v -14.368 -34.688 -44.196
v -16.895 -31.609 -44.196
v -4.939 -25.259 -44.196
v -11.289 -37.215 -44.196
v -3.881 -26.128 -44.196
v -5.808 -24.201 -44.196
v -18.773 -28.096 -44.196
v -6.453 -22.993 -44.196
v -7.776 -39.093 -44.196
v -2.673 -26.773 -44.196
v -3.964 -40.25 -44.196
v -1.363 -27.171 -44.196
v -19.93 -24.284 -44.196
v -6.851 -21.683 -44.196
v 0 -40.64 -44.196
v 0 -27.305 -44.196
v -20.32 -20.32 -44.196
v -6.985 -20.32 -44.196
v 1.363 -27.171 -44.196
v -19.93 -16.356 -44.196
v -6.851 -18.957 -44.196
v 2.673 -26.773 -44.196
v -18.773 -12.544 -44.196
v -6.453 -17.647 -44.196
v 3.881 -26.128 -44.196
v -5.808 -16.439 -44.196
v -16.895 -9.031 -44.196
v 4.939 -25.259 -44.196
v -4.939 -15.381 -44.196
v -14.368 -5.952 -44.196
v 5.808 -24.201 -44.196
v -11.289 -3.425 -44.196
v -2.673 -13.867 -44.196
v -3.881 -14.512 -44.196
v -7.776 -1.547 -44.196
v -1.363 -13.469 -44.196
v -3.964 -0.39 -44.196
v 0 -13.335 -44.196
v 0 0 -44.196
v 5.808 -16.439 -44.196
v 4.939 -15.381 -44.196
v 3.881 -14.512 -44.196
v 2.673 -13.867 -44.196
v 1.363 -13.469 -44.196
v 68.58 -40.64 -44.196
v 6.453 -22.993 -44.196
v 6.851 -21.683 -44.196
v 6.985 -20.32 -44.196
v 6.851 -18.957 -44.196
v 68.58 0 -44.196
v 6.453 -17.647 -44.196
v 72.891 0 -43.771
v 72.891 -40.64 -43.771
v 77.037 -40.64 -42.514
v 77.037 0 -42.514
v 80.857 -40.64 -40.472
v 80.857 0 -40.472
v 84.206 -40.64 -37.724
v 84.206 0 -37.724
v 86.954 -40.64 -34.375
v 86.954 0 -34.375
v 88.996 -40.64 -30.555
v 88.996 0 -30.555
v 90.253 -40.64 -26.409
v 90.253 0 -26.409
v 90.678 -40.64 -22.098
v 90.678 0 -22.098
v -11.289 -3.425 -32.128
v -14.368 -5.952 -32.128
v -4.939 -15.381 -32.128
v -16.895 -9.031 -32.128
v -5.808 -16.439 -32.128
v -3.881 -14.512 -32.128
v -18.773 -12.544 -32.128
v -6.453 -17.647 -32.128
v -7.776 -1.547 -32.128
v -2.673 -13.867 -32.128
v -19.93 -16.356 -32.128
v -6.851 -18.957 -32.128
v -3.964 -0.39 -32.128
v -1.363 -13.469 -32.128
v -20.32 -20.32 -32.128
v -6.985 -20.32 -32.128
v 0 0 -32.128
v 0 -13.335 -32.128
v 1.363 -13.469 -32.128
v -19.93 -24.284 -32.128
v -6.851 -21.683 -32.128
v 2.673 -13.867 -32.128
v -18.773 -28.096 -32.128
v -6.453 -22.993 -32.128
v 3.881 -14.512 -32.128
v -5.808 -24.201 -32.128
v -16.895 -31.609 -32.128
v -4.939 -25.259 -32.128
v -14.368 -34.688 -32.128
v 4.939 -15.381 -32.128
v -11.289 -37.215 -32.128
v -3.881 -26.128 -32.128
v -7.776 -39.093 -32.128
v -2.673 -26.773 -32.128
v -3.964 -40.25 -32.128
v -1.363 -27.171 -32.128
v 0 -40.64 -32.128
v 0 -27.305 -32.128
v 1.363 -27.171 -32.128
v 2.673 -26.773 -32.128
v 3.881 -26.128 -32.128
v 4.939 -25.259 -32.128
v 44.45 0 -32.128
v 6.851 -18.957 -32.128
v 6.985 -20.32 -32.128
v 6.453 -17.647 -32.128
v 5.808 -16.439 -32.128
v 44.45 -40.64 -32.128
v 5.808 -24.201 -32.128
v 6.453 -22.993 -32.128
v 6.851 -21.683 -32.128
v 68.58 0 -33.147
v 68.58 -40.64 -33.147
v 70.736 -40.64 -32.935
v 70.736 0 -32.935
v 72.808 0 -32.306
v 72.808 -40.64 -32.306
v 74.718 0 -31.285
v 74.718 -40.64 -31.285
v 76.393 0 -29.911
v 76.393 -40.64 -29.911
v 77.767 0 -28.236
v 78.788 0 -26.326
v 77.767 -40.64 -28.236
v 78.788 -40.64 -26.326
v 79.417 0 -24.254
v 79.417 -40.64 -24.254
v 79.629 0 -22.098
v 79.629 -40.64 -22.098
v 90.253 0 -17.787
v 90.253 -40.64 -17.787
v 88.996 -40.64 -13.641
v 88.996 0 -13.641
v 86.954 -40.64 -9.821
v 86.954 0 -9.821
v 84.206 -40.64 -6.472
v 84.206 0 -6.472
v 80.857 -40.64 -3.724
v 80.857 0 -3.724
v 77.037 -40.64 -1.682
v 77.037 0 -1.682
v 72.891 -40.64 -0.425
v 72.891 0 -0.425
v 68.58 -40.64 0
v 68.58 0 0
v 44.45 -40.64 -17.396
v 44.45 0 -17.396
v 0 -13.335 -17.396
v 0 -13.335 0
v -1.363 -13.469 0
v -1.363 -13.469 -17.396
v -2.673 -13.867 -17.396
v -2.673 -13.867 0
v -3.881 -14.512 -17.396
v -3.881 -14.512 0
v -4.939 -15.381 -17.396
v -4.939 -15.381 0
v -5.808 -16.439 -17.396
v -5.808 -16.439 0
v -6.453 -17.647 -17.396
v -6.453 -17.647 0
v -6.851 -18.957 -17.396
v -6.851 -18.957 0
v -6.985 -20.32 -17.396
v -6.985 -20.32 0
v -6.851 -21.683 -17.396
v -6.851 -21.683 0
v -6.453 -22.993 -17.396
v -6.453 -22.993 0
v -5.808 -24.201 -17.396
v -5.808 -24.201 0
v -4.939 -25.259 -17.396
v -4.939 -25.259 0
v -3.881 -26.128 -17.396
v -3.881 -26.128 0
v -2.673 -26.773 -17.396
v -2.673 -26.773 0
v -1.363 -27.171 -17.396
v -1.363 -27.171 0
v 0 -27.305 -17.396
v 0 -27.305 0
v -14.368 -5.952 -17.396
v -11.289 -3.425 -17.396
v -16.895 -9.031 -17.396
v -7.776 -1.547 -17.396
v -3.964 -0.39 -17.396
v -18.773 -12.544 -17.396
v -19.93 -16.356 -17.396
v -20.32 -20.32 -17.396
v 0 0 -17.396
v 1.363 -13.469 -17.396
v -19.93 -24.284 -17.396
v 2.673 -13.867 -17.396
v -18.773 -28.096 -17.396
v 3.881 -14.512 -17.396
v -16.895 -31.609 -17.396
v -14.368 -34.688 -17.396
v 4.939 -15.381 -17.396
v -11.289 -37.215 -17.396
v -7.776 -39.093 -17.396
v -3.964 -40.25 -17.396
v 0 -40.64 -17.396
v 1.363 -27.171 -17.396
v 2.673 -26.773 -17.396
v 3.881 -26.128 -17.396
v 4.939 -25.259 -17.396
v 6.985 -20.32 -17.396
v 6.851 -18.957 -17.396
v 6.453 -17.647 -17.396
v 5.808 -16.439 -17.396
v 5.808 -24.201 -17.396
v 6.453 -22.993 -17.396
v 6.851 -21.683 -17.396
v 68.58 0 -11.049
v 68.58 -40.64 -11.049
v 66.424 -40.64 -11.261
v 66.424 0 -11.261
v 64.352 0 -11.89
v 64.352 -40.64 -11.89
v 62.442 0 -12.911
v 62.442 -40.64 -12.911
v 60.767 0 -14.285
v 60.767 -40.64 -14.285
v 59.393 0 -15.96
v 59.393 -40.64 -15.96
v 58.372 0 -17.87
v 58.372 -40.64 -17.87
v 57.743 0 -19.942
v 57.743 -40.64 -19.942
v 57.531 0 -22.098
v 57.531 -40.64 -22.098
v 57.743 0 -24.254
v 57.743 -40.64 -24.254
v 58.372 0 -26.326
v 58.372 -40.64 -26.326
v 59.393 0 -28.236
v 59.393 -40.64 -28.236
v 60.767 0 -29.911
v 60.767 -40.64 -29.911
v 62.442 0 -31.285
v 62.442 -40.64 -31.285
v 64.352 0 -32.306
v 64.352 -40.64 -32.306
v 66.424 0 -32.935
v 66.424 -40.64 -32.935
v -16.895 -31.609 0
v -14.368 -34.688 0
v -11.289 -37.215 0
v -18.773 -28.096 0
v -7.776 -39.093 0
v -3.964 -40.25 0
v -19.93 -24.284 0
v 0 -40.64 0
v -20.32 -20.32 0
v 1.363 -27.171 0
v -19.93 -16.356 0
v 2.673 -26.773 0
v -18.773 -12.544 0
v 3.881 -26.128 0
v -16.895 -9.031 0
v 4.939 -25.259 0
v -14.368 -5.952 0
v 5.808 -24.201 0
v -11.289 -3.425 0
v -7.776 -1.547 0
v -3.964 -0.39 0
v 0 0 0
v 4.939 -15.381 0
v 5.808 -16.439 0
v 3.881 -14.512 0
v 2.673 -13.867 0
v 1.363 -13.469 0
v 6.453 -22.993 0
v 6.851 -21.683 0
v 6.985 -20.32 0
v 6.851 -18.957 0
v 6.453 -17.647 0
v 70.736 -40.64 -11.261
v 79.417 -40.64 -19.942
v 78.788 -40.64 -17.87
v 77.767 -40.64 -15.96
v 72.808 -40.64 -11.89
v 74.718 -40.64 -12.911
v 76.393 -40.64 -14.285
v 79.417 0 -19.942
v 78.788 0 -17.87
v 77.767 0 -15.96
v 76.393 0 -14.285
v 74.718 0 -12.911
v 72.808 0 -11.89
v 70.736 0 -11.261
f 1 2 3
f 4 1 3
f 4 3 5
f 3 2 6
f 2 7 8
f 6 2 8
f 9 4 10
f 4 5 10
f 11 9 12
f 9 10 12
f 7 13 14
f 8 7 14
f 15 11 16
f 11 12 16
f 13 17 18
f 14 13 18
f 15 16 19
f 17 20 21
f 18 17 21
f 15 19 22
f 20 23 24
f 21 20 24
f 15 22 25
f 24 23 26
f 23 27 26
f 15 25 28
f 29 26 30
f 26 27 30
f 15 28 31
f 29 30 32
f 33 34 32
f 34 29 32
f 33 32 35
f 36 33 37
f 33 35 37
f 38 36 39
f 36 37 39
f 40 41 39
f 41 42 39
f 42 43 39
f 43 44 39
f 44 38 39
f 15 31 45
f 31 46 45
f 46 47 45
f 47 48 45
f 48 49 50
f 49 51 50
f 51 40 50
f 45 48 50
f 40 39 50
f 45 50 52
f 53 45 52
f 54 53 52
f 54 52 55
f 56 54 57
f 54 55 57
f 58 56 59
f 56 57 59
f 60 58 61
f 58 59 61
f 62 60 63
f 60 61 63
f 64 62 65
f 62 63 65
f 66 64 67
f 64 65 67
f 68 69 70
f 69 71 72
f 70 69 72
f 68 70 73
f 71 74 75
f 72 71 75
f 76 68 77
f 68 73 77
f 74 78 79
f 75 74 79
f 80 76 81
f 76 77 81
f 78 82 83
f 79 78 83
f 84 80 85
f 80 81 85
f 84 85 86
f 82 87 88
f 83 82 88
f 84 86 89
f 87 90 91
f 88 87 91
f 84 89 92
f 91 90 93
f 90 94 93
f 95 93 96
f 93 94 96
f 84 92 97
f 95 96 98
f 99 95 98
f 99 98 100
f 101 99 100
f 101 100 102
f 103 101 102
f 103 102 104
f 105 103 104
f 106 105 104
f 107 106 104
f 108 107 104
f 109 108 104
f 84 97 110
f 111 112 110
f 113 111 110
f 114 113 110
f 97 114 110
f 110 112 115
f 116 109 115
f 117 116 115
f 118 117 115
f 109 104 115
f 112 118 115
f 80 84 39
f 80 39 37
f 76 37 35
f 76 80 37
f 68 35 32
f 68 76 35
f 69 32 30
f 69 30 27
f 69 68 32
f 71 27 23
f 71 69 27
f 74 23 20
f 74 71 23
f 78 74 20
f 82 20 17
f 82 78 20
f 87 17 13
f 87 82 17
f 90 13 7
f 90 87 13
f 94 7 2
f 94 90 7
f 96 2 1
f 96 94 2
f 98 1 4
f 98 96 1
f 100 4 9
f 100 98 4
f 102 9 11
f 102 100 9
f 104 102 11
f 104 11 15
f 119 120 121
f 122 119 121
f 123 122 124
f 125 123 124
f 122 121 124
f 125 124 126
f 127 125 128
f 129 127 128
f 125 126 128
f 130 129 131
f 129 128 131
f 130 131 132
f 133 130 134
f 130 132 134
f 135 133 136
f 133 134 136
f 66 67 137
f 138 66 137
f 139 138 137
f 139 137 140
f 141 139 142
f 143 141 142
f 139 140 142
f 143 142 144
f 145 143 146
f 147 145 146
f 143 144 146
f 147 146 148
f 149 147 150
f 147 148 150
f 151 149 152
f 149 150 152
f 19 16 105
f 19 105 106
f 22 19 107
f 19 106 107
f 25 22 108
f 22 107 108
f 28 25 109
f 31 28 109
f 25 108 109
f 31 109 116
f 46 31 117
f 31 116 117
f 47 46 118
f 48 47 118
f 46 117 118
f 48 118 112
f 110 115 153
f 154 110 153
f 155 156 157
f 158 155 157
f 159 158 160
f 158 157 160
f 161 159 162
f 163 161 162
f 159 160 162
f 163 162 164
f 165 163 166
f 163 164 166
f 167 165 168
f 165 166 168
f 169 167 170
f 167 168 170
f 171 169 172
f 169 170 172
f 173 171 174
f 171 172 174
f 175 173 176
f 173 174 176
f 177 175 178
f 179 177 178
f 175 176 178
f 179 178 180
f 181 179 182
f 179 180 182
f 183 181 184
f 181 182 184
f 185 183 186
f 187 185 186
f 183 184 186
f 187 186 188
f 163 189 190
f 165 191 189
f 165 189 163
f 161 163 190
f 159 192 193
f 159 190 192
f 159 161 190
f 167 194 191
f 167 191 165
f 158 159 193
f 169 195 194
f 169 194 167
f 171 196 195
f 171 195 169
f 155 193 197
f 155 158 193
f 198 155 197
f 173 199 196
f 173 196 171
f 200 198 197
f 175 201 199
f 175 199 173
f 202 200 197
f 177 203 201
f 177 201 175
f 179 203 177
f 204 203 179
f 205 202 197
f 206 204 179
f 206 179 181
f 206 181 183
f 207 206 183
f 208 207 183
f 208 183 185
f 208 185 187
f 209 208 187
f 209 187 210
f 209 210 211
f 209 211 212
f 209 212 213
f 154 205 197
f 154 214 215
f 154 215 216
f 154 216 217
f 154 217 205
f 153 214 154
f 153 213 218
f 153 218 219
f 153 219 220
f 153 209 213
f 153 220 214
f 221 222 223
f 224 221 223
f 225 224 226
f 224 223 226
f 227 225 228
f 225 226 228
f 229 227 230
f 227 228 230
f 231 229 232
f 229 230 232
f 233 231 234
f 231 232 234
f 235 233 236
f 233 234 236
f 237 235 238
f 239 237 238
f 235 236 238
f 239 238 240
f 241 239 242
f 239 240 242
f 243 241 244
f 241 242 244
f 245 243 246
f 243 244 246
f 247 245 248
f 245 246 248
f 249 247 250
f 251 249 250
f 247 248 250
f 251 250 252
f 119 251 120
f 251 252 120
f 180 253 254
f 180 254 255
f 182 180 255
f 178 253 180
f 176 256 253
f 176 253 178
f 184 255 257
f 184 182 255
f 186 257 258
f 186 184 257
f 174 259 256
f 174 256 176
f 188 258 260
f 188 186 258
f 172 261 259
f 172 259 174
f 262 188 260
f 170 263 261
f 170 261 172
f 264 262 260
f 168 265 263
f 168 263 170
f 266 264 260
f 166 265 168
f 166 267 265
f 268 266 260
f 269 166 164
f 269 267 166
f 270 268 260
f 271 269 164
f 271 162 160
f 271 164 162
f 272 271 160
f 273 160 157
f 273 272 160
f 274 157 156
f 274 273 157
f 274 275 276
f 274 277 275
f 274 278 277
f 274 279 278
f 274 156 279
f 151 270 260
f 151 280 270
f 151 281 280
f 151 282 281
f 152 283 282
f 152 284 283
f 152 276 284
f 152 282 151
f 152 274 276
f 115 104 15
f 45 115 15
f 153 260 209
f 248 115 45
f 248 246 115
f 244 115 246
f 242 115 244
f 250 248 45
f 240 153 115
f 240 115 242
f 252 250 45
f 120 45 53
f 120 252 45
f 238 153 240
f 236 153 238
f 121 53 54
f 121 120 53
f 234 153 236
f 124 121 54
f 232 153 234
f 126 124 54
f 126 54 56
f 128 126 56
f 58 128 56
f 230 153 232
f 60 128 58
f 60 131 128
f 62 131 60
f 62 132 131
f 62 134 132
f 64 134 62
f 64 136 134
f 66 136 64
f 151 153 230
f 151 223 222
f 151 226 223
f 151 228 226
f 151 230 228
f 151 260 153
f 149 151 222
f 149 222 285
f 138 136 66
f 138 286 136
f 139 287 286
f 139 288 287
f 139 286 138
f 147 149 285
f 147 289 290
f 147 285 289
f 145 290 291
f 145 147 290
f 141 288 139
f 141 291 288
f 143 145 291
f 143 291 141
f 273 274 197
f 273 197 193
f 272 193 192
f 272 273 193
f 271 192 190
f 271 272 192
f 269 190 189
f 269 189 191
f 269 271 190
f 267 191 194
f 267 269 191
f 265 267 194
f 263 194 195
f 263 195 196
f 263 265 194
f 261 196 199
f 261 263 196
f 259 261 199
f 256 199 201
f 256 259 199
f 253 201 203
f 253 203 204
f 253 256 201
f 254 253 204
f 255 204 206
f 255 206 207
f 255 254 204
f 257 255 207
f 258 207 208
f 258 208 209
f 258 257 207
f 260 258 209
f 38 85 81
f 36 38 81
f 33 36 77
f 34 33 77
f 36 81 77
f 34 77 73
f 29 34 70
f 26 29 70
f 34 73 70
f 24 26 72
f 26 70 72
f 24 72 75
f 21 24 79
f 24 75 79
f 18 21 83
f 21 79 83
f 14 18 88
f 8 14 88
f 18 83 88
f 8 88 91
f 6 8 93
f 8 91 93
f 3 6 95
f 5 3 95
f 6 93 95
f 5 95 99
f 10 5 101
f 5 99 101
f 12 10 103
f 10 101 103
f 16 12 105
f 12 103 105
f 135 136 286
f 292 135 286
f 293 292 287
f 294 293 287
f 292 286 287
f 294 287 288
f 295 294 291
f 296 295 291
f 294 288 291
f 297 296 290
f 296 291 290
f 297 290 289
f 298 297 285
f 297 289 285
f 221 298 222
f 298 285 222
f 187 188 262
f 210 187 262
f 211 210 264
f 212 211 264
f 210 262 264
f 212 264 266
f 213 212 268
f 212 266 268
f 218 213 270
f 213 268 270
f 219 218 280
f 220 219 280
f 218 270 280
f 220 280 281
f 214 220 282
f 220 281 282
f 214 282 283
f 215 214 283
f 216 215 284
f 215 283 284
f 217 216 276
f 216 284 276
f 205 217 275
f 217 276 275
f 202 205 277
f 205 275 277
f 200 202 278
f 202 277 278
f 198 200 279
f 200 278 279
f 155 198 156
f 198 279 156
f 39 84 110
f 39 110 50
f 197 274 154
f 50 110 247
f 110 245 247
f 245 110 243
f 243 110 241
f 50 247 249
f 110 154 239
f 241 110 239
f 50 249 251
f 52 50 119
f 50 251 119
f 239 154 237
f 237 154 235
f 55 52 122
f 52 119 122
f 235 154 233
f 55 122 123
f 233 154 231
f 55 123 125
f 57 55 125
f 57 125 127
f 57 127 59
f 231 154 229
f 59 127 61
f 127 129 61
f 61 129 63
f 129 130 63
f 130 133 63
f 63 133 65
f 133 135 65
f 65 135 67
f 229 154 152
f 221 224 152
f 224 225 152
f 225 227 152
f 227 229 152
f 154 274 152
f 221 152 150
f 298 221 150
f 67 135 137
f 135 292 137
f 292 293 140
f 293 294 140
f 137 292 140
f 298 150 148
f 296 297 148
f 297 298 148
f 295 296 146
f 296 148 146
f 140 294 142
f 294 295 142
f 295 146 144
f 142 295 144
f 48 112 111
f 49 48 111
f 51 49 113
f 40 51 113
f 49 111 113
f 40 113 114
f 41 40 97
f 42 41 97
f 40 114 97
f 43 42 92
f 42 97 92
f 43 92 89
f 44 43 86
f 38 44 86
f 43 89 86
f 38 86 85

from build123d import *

# Parameters (mm, degrees)
F1_DEPTH  = 40.64
F3_DEPTH  = 44.196
F4_W      = 44.45
F4_H      = 14.732
F5_DEPTH  = 40.641
F6_W      = 20.32
F6_H      = 14.732
F7_DEPTH  = 40.641
F9_DEPTH  = 44.197
F11_DEPTH = 40.641


with BuildPart() as f1:
    # F0 (on Front) → F1 (new body)
    with BuildSketch(Plane.XZ):
        with BuildLine():
            Line((68.58, 0), (0, 0))
            Line((0, 0), (0, -44.196))
            Line((0, -44.196), (68.58, -44.196))
            ThreePointArc((68.58, -44.196), (46.482, -22.098), (68.58, 0))
        make_face()
        with BuildLine():
            ThreePointArc((90.678, -22.098), (84.2056456507, -6.4723543493), (68.58, 0))
            Line((68.58, 0), (68.58, -44.196))
            ThreePointArc((68.58, -44.196), (84.2056456507, -37.7236456507), (90.678, -22.098))
        make_face()
        with BuildLine():
            Line((68.58, -44.196), (68.58, 0))
            ThreePointArc((68.58, 0), (46.482, -22.098), (68.58, -44.196))
        make_face()
    extrude(amount=F1_DEPTH)

    # F2 (on face) → F3 (join)
    with BuildSketch(Plane.XY):
        with BuildLine():
            Line((0, -40.64), (0, 0))
            ThreePointArc((0, 0), (-20.32, -20.32), (0, -40.64))
        make_face()
    extrude(amount=-F3_DEPTH)

    # F4 (on face) → F5 (cut, through all)
    with BuildSketch(Plane.XZ.offset(40.64)):
        with Locations((22.225, -24.7622483637)):
            Rectangle(F4_W, F4_H)
    extrude(amount=-F5_DEPTH, mode=Mode.SUBTRACT)

    # F6 (on face) → F7 (cut, through all)
    with BuildSketch(Plane.XZ.offset(40.64)):
        with Locations((-10.16, -24.7622483637)):
            Rectangle(F6_W, F6_H)
    extrude(amount=-F7_DEPTH, mode=Mode.SUBTRACT)

    # F8 (on face) → F9 (cut, through all)
    with BuildSketch(Plane.XY):
        with BuildLine():
            ThreePointArc((0, -13.335), (-6.985, -20.32), (0, -27.305))
            Line((0, -27.305), (0, -13.335))
        make_face()
        with BuildLine():
            Line((0, -13.335), (0, -27.305))
            ThreePointArc((0, -27.305), (4.9391408666, -25.2591408666), (6.985, -20.32))
            ThreePointArc((6.985, -20.32), (4.9391408666, -15.3808591334), (0, -13.335))
        make_face()
    extrude(amount=-F9_DEPTH, mode=Mode.SUBTRACT)

    # F10 (on face) → F11 (cut, through all)
    with BuildSketch(Plane.XZ.offset(40.64)):
        with BuildLine():
            ThreePointArc((79.629, -22.098), (76.3928228253, -14.2851771747), (68.58, -11.049))
            Line((68.58, -11.049), (68.58, -33.147))
            ThreePointArc((68.58, -33.147), (76.3928228253, -29.9108228253), (79.629, -22.098))
        make_face()
        with BuildLine():
            Line((68.58, -33.147), (68.58, -11.049))
            ThreePointArc((68.58, -11.049), (57.531, -22.098), (68.58, -33.147))
        make_face()
    extrude(amount=-F11_DEPTH, mode=Mode.SUBTRACT)


solid = f1.part
